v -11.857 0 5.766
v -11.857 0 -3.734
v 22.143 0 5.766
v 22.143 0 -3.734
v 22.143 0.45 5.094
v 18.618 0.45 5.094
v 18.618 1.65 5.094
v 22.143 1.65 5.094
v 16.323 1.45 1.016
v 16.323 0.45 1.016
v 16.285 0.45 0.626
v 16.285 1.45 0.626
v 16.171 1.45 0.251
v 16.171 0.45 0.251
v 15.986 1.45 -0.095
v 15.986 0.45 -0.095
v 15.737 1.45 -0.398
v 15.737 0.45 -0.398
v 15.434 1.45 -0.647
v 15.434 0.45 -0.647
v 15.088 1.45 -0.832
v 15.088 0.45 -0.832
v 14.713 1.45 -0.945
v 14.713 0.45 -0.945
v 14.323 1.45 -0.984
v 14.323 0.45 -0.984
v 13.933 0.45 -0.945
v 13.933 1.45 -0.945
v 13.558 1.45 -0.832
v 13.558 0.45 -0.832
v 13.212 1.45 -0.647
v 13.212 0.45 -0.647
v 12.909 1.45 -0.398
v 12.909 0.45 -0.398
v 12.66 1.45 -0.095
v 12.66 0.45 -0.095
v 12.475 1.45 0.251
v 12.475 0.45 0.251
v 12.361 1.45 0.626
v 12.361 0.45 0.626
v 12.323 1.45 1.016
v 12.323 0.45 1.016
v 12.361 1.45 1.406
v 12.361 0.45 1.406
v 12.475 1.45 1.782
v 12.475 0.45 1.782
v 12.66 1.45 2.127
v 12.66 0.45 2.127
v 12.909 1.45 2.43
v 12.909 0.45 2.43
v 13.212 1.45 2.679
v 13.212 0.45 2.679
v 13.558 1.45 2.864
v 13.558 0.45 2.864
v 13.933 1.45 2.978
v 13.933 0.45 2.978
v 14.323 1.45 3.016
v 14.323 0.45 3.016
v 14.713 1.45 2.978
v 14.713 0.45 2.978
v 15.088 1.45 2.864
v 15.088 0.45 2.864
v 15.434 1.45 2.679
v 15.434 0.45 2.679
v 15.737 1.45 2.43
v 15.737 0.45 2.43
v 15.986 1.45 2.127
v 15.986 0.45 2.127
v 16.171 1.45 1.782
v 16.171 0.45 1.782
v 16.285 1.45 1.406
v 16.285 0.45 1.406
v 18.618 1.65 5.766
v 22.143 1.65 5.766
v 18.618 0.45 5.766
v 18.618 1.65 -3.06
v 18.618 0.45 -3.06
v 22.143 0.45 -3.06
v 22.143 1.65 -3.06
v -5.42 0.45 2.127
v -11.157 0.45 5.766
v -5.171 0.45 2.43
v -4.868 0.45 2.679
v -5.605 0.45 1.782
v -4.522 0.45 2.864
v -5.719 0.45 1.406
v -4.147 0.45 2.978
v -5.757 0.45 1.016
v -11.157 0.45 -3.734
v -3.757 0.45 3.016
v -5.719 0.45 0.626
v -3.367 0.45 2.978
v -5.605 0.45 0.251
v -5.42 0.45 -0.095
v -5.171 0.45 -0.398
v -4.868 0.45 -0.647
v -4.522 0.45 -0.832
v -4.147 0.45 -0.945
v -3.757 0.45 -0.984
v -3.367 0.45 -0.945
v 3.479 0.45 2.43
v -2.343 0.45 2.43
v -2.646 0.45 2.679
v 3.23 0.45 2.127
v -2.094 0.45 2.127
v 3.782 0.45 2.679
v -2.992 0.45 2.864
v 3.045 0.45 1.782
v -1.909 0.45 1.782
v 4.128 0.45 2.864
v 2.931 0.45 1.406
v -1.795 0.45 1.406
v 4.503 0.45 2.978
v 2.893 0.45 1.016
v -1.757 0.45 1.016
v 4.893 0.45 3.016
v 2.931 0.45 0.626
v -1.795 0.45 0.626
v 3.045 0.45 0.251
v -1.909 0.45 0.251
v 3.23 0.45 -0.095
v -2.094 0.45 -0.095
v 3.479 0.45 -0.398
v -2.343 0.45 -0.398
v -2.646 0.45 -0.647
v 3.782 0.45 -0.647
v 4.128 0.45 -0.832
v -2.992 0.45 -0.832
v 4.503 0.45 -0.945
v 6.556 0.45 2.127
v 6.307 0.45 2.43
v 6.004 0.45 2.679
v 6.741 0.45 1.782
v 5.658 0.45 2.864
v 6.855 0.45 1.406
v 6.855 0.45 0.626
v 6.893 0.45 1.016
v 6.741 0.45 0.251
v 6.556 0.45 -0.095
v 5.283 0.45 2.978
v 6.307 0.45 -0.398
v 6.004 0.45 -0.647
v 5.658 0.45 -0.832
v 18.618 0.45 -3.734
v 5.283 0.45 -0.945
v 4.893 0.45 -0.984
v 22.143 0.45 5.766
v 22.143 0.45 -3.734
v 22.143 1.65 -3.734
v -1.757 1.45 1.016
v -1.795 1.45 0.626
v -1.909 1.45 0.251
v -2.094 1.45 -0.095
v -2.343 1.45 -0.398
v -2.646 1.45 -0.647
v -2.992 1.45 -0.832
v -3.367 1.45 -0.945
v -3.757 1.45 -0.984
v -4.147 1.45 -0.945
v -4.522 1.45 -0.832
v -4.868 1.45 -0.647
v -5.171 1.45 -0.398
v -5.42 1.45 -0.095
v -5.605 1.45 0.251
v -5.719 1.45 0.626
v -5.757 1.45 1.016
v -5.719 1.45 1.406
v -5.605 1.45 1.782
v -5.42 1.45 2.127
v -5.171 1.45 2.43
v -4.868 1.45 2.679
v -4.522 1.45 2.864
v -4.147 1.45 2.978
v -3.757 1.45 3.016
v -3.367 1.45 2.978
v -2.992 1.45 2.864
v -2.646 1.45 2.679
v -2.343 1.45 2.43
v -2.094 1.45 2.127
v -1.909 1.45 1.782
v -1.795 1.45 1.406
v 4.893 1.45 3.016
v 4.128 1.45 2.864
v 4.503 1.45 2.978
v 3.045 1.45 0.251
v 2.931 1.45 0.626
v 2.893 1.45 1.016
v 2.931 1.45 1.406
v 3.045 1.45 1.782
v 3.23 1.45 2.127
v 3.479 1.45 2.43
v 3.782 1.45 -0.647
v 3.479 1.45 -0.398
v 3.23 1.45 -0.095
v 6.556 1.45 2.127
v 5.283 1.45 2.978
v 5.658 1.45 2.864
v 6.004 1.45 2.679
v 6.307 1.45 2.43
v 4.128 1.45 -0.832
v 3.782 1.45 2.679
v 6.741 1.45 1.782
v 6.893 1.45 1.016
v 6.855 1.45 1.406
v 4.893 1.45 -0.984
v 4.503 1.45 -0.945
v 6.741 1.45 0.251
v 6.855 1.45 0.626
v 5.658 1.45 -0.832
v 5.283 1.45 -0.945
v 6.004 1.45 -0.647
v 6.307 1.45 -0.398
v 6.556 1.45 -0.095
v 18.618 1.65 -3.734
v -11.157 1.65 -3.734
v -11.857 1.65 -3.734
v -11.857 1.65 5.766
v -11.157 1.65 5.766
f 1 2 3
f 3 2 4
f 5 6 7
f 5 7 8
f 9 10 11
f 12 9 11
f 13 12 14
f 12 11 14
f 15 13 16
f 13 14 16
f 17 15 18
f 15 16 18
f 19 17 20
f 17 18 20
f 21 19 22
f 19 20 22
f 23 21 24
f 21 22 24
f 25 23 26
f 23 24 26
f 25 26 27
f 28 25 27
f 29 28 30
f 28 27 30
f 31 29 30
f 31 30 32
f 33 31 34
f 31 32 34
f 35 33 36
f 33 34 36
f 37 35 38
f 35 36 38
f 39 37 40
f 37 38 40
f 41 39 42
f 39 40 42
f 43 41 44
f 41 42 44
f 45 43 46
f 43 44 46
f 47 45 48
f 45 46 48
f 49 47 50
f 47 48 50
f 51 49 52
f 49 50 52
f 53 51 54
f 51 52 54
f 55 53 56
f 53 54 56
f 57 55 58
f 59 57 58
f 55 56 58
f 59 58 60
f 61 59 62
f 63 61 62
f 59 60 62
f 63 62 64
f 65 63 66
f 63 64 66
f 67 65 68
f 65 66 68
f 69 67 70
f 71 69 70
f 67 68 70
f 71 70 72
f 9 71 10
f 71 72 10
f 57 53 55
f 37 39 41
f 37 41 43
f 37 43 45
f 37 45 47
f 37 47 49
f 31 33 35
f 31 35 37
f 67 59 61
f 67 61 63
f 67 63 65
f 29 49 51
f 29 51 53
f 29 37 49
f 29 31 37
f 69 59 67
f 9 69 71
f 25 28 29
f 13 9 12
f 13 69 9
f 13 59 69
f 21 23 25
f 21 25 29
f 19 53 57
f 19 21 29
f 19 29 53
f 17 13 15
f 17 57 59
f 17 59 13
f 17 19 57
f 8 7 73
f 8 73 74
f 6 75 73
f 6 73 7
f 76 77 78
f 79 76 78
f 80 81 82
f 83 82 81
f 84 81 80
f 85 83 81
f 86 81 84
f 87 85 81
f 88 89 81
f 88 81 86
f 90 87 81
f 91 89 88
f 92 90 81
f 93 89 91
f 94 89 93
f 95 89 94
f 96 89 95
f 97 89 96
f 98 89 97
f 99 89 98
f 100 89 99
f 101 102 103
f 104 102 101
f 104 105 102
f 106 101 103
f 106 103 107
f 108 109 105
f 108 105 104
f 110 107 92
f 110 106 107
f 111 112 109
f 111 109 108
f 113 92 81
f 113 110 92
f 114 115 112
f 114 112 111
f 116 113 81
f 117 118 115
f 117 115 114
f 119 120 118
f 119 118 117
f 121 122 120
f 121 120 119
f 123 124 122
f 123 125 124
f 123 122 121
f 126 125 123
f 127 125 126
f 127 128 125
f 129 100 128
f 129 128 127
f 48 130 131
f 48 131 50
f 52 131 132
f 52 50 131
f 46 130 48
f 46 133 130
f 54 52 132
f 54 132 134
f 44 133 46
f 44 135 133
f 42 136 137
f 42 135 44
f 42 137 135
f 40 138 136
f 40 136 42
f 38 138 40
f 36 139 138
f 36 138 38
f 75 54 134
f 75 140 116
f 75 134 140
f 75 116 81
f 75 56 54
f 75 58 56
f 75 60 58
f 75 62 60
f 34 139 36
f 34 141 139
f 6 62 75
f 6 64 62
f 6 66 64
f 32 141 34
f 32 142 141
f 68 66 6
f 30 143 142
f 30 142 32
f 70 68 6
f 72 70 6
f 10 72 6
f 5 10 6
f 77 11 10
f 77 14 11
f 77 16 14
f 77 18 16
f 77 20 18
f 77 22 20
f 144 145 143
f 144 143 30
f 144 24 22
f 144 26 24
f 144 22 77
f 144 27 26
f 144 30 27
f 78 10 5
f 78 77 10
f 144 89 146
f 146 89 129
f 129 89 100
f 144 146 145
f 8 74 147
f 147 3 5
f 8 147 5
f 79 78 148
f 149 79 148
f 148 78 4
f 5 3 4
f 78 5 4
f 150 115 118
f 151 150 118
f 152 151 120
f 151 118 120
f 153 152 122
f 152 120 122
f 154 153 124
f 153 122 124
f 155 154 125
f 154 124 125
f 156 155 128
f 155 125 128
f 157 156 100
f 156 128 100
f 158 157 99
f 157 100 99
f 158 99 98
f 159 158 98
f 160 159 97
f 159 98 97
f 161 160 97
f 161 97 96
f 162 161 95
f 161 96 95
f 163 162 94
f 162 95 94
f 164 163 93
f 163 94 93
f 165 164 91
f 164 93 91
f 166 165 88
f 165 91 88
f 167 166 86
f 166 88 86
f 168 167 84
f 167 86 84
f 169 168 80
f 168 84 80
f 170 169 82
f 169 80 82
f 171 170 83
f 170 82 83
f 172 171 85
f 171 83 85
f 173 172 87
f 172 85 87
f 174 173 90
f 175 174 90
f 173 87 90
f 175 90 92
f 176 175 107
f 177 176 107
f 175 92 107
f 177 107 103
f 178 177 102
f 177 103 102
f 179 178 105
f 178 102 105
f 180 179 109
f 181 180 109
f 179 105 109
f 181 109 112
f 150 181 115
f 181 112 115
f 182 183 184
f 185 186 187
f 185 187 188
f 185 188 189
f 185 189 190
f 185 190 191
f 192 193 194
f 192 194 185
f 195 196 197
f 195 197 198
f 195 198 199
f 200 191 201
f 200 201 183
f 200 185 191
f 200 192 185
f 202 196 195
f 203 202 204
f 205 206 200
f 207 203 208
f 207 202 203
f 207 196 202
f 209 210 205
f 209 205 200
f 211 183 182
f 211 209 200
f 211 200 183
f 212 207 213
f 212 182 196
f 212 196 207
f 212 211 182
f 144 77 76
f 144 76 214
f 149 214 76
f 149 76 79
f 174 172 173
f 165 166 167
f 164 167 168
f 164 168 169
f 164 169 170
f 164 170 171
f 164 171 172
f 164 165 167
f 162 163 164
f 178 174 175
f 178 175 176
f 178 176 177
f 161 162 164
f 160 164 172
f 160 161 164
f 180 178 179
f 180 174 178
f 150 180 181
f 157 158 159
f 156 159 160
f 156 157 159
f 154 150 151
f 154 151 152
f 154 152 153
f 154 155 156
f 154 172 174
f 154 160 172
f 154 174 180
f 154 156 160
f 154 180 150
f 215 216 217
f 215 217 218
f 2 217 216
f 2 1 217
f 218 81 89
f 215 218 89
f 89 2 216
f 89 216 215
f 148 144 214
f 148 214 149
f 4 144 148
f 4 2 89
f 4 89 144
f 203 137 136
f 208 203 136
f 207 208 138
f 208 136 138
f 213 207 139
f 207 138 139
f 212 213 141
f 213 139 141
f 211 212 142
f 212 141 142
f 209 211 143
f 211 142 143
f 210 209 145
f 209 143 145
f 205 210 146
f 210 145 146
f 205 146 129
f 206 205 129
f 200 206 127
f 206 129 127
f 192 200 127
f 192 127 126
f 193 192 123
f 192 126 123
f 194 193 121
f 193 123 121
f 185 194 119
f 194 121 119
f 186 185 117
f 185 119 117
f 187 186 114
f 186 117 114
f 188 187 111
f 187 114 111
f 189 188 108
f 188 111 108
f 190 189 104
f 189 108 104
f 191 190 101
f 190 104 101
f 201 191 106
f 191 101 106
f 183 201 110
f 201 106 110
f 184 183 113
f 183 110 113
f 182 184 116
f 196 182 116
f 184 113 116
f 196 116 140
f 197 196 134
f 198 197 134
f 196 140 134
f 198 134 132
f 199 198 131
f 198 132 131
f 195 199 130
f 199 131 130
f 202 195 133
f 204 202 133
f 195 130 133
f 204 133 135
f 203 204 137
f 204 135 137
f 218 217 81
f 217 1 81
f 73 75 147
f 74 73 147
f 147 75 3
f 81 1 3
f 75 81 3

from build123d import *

# Parameters (mm, degrees)
SKETCH1_W           = 34
SKETCH1_H           = 9.5
BOSS_EXTRUDE1_DEPTH = 0.45
SKETCH2_W           = 0.7
SKETCH2_H           = 9.5
BOSS_EXTRUDE2_DEPTH = 1.2
SKETCH3_R           = 2
BOSS_EXTRUDE3_DEPTH = 1
SKETCH4_W           = 3.524824873
SKETCH4_H           = 0.673444534
SKETCH4_H_2         = 0.672160641
BOSS_EXTRUDE4_DEPTH = 1.2


with BuildPart() as part:
    # Sketch1 → Boss-Extrude1 (new body)
    with BuildSketch(Plane(origin=(0, 0, 0), x_dir=(1, 0, 0), z_dir=(0, 1, 0))):
        with Locations((5.143034826, -1.016169154)):
            Rectangle(SKETCH1_W, SKETCH1_H)
    extrude(amount=BOSS_EXTRUDE1_DEPTH)

    # Sketch2 → Boss-Extrude2 (add)
    with BuildSketch(Plane(origin=(0, 0.45, 0), x_dir=(1, 0, 0), z_dir=(0, 1, 0))):
        with Locations((-11.506965174, -1.016169154)):
            Rectangle(SKETCH2_W, SKETCH2_H)
    extrude(amount=BOSS_EXTRUDE2_DEPTH)

    # Sketch3 → Boss-Extrude3 (add)
    with BuildSketch(Plane(origin=(0, 0.45, 0), x_dir=(1, 0, 0), z_dir=(0, 1, 0))):
        with Locations((-3.756965174, -1.016169154)):
            Circle(SKETCH3_R)
        with Locations((4.893034826, -1.016169154)):
            Circle(SKETCH3_R)
        with Locations((14.323034826, -1.016169154)):
            Circle(SKETCH3_R)
    extrude(amount=BOSS_EXTRUDE3_DEPTH)

    # Sketch4 → Boss-Extrude4 (add)
    with BuildSketch(Plane(origin=(0, 0.45, 0), x_dir=(1, 0, 0), z_dir=(0, 1, 0))):
        with Locations((20.38062239, 3.397108579)):
            Rectangle(SKETCH4_W, SKETCH4_H)
        with Locations((20.38062239, -5.430088834)):
            Rectangle(SKETCH4_W, SKETCH4_H_2)
    extrude(amount=BOSS_EXTRUDE4_DEPTH)


solid = part.part
